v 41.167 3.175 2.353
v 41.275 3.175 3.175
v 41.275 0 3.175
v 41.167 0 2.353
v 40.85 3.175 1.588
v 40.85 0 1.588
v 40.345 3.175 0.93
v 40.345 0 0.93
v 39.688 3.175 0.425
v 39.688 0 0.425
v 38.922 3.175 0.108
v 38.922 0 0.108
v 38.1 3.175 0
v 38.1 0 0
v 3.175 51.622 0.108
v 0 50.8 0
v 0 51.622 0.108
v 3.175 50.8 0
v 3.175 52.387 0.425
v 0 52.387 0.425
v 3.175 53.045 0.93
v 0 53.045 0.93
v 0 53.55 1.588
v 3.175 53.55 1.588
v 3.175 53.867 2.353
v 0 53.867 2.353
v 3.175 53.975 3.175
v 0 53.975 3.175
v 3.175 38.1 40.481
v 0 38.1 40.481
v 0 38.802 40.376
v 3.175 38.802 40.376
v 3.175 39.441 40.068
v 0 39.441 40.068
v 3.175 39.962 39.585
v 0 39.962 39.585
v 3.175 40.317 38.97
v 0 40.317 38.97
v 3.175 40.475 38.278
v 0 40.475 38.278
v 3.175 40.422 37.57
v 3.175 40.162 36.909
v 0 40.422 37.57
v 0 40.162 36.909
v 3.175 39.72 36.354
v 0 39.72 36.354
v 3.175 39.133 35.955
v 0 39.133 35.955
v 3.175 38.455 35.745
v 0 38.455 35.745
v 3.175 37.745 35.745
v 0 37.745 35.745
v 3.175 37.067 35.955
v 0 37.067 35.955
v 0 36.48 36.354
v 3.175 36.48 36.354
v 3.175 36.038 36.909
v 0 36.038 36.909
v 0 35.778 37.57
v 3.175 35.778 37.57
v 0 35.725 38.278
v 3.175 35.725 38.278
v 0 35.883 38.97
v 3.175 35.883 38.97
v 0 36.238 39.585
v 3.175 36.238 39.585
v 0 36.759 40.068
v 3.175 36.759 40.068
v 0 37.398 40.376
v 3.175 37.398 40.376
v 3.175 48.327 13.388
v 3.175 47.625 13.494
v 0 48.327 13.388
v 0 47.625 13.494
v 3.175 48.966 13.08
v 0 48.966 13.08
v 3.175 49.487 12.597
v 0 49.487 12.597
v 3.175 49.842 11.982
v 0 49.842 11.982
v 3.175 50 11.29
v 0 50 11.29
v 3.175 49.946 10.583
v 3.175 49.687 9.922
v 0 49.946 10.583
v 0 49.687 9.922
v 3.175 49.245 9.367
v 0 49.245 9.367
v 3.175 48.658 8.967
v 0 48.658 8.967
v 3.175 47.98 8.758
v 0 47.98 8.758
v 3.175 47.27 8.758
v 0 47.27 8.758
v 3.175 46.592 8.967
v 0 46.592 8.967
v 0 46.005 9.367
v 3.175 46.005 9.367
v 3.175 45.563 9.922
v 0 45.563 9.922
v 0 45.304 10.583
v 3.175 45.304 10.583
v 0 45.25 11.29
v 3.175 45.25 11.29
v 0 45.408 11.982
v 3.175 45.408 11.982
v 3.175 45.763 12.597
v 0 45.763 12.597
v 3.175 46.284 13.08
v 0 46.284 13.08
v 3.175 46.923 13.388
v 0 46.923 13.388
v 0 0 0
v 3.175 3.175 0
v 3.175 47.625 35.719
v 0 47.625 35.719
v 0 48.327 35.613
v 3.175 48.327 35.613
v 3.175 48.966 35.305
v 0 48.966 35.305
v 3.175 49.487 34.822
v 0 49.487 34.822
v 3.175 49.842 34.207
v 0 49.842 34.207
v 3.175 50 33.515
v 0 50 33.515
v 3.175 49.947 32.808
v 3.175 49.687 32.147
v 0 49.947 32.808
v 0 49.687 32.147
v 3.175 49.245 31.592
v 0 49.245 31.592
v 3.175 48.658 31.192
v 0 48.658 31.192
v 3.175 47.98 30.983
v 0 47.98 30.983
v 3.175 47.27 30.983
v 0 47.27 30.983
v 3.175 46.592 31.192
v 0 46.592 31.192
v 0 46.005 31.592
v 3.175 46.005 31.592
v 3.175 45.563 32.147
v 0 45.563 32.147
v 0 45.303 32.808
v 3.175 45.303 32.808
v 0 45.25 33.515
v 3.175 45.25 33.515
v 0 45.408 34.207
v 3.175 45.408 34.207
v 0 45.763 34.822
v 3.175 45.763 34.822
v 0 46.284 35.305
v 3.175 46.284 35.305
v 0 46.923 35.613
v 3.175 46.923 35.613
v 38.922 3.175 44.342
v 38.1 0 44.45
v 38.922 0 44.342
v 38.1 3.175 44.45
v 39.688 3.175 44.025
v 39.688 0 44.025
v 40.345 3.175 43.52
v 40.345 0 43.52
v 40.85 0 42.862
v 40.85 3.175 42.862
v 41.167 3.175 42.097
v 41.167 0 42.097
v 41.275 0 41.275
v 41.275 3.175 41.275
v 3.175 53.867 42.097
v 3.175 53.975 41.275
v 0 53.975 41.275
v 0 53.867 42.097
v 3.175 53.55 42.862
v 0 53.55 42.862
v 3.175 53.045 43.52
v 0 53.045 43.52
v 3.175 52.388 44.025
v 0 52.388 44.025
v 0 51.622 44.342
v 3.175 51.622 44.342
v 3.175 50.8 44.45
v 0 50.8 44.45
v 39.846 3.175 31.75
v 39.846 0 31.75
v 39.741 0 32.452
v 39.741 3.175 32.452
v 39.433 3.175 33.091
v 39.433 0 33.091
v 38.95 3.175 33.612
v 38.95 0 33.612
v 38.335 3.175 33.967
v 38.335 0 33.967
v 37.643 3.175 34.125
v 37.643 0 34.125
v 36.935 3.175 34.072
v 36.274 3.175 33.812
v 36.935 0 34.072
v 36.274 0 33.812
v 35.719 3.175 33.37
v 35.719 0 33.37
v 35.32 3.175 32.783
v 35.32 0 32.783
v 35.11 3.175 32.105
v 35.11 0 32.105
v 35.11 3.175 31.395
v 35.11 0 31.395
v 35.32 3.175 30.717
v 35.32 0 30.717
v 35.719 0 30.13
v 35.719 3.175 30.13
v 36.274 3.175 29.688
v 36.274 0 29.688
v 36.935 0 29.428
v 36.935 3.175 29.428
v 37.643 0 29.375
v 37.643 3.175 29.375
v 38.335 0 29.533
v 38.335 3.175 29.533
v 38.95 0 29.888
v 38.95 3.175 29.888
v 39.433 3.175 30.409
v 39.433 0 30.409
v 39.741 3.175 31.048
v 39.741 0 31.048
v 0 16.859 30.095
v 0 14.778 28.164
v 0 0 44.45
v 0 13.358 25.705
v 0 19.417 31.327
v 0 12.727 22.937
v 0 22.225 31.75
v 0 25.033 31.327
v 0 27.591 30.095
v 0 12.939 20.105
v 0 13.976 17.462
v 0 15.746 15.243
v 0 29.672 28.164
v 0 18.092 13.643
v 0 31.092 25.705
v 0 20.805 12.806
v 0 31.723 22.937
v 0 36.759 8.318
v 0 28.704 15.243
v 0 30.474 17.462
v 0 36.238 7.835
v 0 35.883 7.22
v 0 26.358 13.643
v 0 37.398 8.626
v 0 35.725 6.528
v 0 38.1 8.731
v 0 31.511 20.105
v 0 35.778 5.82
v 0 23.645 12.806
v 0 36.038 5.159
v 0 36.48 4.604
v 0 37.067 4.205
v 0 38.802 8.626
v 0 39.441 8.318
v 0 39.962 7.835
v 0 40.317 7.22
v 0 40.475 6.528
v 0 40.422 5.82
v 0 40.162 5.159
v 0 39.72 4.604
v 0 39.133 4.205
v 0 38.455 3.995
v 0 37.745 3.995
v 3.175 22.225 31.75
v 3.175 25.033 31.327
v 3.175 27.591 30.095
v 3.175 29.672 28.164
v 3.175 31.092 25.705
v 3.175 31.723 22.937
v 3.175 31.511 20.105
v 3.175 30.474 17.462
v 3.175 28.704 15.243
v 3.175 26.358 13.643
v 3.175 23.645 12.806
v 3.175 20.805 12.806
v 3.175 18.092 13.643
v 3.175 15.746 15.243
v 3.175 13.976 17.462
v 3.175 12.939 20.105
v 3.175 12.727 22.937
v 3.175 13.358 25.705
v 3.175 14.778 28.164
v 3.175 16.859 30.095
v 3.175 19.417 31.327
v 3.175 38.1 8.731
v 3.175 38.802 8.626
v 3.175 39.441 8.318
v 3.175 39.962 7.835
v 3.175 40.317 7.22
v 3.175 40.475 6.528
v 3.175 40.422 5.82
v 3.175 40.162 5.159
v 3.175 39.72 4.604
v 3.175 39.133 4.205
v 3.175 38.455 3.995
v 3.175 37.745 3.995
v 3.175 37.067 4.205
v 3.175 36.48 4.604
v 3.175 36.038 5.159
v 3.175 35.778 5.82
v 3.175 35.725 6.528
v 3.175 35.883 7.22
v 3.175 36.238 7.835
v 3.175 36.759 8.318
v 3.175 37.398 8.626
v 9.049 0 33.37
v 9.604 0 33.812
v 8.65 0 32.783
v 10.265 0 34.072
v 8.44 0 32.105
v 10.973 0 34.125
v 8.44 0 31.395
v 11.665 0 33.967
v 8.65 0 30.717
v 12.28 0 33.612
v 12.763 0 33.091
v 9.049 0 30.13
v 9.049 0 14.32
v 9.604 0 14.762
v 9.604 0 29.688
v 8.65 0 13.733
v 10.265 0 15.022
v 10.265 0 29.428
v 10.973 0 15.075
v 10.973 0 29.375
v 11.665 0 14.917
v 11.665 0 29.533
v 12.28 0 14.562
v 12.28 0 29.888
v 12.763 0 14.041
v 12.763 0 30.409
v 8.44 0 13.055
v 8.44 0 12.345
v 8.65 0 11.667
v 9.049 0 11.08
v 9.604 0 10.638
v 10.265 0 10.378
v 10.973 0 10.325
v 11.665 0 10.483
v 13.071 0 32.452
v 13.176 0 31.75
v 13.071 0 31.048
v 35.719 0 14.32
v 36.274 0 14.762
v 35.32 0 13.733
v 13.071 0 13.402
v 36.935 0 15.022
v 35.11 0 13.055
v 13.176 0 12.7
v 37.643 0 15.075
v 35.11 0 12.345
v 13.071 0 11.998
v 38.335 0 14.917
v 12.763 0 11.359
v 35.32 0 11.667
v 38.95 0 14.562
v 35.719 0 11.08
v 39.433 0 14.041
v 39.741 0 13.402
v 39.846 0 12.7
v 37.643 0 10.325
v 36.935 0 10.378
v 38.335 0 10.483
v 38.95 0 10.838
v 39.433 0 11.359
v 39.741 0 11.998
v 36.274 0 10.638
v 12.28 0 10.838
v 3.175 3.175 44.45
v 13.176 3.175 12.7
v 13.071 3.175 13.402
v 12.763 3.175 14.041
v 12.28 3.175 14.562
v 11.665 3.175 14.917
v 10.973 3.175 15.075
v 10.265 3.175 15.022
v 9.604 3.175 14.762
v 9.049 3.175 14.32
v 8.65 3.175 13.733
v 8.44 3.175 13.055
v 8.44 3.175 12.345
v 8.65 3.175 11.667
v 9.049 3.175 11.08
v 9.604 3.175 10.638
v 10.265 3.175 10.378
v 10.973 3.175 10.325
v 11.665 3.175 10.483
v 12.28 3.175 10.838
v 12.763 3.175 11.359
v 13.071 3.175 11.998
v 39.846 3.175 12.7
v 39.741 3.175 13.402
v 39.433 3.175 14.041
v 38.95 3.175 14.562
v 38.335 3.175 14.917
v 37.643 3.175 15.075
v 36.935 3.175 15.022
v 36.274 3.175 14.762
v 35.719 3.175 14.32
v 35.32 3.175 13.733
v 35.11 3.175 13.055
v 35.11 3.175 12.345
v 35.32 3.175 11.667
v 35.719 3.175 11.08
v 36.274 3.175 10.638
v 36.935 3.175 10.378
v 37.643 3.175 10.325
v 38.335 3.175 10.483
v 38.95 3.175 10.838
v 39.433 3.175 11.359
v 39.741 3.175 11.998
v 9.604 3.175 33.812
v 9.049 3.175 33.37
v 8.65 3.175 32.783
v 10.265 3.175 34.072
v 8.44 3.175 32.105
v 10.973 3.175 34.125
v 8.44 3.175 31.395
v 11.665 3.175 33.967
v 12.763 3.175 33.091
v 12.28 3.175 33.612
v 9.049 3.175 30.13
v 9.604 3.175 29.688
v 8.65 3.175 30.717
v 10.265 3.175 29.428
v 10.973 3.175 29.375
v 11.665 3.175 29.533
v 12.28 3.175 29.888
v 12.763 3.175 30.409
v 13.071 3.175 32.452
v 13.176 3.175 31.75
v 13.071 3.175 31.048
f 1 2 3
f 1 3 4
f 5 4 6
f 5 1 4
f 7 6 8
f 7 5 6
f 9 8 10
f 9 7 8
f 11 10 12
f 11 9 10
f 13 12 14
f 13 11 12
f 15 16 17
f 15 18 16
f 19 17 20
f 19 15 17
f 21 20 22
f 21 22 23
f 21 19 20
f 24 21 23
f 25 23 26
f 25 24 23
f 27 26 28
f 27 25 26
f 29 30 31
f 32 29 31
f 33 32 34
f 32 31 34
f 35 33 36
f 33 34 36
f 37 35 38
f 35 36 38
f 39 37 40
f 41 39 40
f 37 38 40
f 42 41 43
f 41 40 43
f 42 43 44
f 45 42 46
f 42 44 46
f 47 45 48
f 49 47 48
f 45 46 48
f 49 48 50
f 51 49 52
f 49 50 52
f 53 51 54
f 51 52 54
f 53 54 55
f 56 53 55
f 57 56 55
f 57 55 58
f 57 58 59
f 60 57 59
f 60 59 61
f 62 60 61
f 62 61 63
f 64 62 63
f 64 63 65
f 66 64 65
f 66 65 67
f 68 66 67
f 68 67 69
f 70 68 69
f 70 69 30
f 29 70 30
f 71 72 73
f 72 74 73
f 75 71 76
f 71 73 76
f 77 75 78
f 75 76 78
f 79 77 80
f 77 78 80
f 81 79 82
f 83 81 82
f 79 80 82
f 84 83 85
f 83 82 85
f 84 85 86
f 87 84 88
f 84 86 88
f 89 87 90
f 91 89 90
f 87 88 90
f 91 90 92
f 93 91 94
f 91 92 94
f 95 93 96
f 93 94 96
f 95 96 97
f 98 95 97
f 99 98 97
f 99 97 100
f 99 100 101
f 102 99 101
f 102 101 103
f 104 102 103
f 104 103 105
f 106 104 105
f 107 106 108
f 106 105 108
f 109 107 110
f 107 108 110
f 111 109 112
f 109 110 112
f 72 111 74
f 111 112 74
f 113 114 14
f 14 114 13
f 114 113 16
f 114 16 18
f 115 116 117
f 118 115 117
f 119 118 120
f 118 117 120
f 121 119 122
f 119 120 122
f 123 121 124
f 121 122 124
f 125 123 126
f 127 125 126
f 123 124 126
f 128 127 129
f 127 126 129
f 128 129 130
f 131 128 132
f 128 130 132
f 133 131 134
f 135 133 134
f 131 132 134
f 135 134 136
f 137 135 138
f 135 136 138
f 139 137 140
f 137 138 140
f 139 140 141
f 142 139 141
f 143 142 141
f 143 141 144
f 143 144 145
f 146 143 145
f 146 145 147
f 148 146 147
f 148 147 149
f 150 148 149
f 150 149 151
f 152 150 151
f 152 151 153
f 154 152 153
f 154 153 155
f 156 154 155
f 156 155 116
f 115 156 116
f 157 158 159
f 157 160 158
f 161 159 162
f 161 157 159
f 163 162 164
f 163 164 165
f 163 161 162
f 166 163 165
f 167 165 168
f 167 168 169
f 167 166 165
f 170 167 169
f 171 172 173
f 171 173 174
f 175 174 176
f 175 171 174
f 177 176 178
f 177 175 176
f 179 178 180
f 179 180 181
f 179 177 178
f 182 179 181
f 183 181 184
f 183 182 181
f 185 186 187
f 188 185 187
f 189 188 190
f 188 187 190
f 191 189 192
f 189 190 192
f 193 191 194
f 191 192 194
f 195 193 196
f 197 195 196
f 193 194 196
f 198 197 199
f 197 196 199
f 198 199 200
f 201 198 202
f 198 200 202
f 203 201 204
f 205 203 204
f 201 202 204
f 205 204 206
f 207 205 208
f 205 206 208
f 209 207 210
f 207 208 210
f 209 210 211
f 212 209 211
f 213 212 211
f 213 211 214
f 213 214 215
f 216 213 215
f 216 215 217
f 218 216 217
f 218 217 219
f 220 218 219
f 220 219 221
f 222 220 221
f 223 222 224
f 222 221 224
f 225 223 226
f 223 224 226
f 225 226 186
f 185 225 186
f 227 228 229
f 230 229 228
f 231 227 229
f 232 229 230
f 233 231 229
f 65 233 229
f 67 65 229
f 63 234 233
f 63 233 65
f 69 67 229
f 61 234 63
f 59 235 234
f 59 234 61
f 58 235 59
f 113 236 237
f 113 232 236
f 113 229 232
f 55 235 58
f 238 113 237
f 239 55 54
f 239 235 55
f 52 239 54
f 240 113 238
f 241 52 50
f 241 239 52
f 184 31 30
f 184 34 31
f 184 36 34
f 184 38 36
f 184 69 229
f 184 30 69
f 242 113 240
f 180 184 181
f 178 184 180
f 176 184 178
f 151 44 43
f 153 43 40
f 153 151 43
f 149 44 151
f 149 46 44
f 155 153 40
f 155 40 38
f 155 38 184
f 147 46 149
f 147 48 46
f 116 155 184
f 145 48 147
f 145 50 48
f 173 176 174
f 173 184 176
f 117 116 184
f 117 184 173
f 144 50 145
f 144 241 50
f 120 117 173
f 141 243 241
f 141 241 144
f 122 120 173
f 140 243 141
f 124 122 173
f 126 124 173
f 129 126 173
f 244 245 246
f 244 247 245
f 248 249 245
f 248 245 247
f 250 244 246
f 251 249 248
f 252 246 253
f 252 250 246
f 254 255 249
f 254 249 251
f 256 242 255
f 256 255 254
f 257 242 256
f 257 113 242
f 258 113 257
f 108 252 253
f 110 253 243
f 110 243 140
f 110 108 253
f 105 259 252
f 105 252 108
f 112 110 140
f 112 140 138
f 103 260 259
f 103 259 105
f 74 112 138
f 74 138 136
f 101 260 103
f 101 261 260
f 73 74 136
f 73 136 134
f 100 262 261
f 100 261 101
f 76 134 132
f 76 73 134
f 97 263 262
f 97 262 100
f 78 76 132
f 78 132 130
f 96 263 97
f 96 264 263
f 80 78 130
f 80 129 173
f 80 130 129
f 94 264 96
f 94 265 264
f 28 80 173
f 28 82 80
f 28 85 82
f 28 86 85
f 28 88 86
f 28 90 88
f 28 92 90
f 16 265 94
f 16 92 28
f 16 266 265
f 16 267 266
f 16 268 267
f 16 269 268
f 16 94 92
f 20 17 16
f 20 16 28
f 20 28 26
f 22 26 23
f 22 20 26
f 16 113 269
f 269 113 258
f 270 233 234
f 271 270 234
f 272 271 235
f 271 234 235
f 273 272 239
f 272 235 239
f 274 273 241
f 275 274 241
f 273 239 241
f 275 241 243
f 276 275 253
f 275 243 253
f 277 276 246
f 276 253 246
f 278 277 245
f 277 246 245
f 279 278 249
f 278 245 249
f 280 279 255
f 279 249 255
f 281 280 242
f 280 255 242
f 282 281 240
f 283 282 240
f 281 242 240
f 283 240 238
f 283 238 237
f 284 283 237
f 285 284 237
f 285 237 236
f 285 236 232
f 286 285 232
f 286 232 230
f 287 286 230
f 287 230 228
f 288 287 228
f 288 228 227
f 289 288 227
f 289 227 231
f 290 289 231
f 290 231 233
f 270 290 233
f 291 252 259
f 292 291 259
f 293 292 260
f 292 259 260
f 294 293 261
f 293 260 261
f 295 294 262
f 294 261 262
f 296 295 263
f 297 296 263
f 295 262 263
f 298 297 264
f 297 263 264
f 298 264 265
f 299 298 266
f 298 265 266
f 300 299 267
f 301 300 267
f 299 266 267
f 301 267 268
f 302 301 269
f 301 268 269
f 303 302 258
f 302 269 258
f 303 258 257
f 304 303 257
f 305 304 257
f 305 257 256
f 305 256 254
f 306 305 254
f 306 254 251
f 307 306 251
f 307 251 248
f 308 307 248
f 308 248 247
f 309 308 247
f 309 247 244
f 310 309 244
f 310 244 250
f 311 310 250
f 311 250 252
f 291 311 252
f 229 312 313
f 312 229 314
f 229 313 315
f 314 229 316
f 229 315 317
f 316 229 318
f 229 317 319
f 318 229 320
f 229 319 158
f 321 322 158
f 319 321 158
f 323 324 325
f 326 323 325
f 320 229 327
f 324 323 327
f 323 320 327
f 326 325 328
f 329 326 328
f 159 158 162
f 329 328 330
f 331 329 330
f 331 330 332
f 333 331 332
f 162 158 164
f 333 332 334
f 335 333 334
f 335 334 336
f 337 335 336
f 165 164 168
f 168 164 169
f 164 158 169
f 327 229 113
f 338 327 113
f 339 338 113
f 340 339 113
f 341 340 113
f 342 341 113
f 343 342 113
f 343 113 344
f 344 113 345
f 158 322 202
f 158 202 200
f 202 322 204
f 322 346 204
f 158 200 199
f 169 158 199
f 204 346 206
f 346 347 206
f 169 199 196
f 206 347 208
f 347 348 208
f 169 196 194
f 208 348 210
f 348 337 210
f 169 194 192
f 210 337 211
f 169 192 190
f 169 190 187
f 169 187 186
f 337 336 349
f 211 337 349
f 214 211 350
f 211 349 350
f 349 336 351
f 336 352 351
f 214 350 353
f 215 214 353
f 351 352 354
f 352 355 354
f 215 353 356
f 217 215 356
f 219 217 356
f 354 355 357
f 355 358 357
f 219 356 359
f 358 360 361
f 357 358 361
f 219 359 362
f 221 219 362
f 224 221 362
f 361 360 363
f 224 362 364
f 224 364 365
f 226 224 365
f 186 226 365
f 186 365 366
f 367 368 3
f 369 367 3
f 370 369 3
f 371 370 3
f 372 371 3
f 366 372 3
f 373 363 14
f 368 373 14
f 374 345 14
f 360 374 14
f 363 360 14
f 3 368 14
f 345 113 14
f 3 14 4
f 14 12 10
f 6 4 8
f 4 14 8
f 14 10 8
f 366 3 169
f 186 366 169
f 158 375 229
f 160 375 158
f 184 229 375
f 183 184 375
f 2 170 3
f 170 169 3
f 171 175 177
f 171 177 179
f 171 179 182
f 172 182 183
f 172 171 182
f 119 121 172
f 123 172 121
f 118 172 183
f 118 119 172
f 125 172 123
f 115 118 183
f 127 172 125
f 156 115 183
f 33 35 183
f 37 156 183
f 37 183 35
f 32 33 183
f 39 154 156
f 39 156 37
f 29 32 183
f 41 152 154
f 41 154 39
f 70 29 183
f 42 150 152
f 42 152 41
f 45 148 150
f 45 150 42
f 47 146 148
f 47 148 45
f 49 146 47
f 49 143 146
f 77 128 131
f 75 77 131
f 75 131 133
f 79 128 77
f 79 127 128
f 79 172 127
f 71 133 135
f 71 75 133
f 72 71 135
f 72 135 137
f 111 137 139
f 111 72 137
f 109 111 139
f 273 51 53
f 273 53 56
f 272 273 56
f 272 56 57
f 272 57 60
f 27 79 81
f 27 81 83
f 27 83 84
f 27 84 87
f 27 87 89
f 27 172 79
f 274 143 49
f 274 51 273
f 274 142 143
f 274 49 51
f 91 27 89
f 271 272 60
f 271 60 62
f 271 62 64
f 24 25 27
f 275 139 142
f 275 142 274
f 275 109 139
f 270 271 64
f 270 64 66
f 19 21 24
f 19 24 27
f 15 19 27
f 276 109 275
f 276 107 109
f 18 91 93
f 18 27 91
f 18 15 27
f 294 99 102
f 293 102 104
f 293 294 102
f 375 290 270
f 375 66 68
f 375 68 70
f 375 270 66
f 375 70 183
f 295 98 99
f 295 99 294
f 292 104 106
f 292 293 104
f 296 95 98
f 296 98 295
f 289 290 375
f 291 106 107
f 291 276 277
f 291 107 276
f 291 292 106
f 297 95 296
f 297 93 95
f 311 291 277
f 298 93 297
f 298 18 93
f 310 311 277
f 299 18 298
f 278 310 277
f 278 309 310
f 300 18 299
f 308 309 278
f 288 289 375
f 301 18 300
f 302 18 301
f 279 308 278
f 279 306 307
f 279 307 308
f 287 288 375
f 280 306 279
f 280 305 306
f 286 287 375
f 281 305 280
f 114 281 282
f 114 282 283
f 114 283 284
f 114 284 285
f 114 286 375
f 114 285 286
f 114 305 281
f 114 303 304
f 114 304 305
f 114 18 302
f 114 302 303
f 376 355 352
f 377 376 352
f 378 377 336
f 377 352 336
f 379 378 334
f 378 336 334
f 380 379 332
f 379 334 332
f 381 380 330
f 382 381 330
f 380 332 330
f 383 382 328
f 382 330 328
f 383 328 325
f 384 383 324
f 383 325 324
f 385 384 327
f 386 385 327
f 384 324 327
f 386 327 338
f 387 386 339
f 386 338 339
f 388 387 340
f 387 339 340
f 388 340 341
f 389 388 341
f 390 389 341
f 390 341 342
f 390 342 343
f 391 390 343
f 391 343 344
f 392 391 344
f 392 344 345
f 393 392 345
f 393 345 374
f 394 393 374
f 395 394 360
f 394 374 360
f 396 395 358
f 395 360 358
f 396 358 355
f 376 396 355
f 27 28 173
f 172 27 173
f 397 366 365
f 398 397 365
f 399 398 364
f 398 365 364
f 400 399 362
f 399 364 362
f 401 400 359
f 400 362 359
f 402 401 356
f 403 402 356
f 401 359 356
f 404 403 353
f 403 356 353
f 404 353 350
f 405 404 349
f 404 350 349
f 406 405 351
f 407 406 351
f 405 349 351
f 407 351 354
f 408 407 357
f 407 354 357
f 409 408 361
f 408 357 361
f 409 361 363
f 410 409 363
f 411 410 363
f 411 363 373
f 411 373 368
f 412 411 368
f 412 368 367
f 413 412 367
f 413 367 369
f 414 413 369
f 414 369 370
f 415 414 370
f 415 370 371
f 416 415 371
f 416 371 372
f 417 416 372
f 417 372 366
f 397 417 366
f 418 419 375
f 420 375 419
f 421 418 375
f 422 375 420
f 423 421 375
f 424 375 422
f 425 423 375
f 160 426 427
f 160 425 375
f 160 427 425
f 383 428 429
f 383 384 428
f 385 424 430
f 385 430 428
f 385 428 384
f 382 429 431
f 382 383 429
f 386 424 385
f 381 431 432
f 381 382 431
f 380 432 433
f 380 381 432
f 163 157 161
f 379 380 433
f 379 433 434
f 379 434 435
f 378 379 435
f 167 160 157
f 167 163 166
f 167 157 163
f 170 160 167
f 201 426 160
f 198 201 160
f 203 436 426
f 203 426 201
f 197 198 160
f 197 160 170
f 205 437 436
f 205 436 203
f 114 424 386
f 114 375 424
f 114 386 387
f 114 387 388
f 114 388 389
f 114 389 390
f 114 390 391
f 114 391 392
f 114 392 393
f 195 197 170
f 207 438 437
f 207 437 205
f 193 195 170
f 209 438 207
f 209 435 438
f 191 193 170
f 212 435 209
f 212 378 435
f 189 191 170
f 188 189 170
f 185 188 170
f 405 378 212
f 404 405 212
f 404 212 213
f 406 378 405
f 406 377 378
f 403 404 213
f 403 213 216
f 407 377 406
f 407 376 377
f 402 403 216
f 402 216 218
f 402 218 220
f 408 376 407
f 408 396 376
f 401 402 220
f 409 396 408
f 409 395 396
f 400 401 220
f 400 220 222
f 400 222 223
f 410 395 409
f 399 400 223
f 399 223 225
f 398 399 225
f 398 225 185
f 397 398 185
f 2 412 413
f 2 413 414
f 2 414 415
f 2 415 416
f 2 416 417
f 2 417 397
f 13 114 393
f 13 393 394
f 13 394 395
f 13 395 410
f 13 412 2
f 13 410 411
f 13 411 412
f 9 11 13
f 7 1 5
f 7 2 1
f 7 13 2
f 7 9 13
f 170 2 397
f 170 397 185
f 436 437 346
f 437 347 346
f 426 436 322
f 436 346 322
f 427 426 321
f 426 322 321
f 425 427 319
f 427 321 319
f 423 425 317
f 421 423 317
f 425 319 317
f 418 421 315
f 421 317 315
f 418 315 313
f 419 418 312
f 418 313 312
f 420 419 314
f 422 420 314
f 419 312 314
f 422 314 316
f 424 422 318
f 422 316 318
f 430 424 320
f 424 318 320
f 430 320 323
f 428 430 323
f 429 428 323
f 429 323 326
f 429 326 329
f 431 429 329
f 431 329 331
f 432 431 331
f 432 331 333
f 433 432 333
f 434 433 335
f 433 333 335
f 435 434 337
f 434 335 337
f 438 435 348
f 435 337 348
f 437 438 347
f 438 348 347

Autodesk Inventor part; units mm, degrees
ref_plane "YZ Plane" through (0, 0, 0) normal (1, 0, 0) x (0, 1, 0)
ref_plane "XZ Plane" through (0, 0, 0) normal (0, 1, 0) x (-1, 0, 0)
ref_plane "XY Plane" through (0, 0, 0) normal (0, 0, 1) x (1, 0, 0)
sketch "Sketch1" plane through (0, 0, 0) normal (0, 0, 1) x (1, 0, 0)
  line L0 (0, 0) -> (50.8, 0)
  line L1 (0, 0) -> (0, 63.5)
  line L2 (0, 63.5) -> (3.175, 63.5)
  line L3 (3.175, 63.5) -> (3.175, 3.175)
  line L4 (3.175, 3.175) -> (50.8, 3.175)
  line L5 (50.8, 3.175) -> (50.8, 0)
  dimension "d0" = 50.8
  dimension "d1" = 63.5
  dimension "d2" = 3.175
extrude "Extrusion1" add sketch "Sketch1" along normal blind 44.45
sketch "Sketch2" plane through (0, 0, 0) normal (-1, 0, 0) x (0, 0, 1)
  line L0 (0, 0) -> (44.45, 0) projected
  line L1 (0, 63.5) -> (44.45, 63.5) projected
  line L2 (22.225, 63.5) -> (22.225, 0) construction
  line L3 (11.1125, 47.625) -> (33.3375, 47.625) construction
  circle A0 centre (11.1125, 47.625) radius 2.3812
  circle A1 centre (33.3375, 47.625) radius 2.3813
  circle A2 centre (22.225, 22.225) radius 9.525
  line L4 (0, 63.5) -> (0, 0) projected
  line L5 (44.45, 63.5) -> (44.45, 0) projected
  line L6 (0, 53.975) -> (44.45, 53.975)
  line L7 (6.35, 38.1) -> (38.1, 38.1) construction
  circle A3 centre (6.35, 38.1) radius 2.3813
  circle A4 centre (38.1, 38.1) radius 2.3813
  point P0 (22.225, 47.625)
  point P1 (22.225, 38.1)
  dimension "d5" = 22.225
  dimension "d6" = 15.875
  dimension "d7" = 4.7625
  dimension "d8" = 4.7625
  dimension "d11" = 19.05
  dimension "d12" = 22.225
  dimension "d30" = 9.525
  dimension "d31" = 15.875
  dimension "d32" = 31.75
extrude "Extrusion2" cut sketch "Sketch2" against normal blind 38.1 contours L4 L1 L5 L6 | A0 | A1 | A2 | A3 | A4
sketch "Sketch3" plane through (0, 0, 0) normal (0, -1, 0) x (1, 0, 0)
  line L0 (50.8, 0) -> (50.8, 44.45) projected
  line L1 (0, 0) -> (0, 44.45) projected
  circle A0 centre (10.795, 31.75) radius 2.3813
  line L2 (10.795, 31.75) -> (10.795, 12.7) construction
  circle A1 centre (10.795, 12.7) radius 2.3813
  line L3 (0, 22.225) -> (50.8, 22.225) construction
  line L4 (0, 0) -> (50.8, 0) projected
  line L5 (0, 44.45) -> (50.8, 44.45) projected
  line L6 (41.275, 44.45) -> (41.275, 0)
  circle A2 centre (37.465, 31.75) radius 2.3813
  circle A3 centre (37.465, 12.7) radius 2.3813
  point P0 (10.795, 22.225)
  dimension "d13" = 19.05
  dimension "d17" = 4.7625
  dimension "d18" = 10.795
  dimension "d21" = 41.275
  dimension "d24" = 26.67
extrude "Extrusion3" cut sketch "Sketch3" against normal blind 25.4 contours L4 L6 L5 L0 | A0 | A1 | A2 | A3
fillet "Fillet1" radius 3.175 4 edges at (41.275, 1.5875, 44.45) (41.275, 1.5875, 0) (1.5875, 53.975, 44.45) (1.5875, 53.975, 0)
properties part number "Angle Aluminum P60 Mount" material "Aluminum 6061"
